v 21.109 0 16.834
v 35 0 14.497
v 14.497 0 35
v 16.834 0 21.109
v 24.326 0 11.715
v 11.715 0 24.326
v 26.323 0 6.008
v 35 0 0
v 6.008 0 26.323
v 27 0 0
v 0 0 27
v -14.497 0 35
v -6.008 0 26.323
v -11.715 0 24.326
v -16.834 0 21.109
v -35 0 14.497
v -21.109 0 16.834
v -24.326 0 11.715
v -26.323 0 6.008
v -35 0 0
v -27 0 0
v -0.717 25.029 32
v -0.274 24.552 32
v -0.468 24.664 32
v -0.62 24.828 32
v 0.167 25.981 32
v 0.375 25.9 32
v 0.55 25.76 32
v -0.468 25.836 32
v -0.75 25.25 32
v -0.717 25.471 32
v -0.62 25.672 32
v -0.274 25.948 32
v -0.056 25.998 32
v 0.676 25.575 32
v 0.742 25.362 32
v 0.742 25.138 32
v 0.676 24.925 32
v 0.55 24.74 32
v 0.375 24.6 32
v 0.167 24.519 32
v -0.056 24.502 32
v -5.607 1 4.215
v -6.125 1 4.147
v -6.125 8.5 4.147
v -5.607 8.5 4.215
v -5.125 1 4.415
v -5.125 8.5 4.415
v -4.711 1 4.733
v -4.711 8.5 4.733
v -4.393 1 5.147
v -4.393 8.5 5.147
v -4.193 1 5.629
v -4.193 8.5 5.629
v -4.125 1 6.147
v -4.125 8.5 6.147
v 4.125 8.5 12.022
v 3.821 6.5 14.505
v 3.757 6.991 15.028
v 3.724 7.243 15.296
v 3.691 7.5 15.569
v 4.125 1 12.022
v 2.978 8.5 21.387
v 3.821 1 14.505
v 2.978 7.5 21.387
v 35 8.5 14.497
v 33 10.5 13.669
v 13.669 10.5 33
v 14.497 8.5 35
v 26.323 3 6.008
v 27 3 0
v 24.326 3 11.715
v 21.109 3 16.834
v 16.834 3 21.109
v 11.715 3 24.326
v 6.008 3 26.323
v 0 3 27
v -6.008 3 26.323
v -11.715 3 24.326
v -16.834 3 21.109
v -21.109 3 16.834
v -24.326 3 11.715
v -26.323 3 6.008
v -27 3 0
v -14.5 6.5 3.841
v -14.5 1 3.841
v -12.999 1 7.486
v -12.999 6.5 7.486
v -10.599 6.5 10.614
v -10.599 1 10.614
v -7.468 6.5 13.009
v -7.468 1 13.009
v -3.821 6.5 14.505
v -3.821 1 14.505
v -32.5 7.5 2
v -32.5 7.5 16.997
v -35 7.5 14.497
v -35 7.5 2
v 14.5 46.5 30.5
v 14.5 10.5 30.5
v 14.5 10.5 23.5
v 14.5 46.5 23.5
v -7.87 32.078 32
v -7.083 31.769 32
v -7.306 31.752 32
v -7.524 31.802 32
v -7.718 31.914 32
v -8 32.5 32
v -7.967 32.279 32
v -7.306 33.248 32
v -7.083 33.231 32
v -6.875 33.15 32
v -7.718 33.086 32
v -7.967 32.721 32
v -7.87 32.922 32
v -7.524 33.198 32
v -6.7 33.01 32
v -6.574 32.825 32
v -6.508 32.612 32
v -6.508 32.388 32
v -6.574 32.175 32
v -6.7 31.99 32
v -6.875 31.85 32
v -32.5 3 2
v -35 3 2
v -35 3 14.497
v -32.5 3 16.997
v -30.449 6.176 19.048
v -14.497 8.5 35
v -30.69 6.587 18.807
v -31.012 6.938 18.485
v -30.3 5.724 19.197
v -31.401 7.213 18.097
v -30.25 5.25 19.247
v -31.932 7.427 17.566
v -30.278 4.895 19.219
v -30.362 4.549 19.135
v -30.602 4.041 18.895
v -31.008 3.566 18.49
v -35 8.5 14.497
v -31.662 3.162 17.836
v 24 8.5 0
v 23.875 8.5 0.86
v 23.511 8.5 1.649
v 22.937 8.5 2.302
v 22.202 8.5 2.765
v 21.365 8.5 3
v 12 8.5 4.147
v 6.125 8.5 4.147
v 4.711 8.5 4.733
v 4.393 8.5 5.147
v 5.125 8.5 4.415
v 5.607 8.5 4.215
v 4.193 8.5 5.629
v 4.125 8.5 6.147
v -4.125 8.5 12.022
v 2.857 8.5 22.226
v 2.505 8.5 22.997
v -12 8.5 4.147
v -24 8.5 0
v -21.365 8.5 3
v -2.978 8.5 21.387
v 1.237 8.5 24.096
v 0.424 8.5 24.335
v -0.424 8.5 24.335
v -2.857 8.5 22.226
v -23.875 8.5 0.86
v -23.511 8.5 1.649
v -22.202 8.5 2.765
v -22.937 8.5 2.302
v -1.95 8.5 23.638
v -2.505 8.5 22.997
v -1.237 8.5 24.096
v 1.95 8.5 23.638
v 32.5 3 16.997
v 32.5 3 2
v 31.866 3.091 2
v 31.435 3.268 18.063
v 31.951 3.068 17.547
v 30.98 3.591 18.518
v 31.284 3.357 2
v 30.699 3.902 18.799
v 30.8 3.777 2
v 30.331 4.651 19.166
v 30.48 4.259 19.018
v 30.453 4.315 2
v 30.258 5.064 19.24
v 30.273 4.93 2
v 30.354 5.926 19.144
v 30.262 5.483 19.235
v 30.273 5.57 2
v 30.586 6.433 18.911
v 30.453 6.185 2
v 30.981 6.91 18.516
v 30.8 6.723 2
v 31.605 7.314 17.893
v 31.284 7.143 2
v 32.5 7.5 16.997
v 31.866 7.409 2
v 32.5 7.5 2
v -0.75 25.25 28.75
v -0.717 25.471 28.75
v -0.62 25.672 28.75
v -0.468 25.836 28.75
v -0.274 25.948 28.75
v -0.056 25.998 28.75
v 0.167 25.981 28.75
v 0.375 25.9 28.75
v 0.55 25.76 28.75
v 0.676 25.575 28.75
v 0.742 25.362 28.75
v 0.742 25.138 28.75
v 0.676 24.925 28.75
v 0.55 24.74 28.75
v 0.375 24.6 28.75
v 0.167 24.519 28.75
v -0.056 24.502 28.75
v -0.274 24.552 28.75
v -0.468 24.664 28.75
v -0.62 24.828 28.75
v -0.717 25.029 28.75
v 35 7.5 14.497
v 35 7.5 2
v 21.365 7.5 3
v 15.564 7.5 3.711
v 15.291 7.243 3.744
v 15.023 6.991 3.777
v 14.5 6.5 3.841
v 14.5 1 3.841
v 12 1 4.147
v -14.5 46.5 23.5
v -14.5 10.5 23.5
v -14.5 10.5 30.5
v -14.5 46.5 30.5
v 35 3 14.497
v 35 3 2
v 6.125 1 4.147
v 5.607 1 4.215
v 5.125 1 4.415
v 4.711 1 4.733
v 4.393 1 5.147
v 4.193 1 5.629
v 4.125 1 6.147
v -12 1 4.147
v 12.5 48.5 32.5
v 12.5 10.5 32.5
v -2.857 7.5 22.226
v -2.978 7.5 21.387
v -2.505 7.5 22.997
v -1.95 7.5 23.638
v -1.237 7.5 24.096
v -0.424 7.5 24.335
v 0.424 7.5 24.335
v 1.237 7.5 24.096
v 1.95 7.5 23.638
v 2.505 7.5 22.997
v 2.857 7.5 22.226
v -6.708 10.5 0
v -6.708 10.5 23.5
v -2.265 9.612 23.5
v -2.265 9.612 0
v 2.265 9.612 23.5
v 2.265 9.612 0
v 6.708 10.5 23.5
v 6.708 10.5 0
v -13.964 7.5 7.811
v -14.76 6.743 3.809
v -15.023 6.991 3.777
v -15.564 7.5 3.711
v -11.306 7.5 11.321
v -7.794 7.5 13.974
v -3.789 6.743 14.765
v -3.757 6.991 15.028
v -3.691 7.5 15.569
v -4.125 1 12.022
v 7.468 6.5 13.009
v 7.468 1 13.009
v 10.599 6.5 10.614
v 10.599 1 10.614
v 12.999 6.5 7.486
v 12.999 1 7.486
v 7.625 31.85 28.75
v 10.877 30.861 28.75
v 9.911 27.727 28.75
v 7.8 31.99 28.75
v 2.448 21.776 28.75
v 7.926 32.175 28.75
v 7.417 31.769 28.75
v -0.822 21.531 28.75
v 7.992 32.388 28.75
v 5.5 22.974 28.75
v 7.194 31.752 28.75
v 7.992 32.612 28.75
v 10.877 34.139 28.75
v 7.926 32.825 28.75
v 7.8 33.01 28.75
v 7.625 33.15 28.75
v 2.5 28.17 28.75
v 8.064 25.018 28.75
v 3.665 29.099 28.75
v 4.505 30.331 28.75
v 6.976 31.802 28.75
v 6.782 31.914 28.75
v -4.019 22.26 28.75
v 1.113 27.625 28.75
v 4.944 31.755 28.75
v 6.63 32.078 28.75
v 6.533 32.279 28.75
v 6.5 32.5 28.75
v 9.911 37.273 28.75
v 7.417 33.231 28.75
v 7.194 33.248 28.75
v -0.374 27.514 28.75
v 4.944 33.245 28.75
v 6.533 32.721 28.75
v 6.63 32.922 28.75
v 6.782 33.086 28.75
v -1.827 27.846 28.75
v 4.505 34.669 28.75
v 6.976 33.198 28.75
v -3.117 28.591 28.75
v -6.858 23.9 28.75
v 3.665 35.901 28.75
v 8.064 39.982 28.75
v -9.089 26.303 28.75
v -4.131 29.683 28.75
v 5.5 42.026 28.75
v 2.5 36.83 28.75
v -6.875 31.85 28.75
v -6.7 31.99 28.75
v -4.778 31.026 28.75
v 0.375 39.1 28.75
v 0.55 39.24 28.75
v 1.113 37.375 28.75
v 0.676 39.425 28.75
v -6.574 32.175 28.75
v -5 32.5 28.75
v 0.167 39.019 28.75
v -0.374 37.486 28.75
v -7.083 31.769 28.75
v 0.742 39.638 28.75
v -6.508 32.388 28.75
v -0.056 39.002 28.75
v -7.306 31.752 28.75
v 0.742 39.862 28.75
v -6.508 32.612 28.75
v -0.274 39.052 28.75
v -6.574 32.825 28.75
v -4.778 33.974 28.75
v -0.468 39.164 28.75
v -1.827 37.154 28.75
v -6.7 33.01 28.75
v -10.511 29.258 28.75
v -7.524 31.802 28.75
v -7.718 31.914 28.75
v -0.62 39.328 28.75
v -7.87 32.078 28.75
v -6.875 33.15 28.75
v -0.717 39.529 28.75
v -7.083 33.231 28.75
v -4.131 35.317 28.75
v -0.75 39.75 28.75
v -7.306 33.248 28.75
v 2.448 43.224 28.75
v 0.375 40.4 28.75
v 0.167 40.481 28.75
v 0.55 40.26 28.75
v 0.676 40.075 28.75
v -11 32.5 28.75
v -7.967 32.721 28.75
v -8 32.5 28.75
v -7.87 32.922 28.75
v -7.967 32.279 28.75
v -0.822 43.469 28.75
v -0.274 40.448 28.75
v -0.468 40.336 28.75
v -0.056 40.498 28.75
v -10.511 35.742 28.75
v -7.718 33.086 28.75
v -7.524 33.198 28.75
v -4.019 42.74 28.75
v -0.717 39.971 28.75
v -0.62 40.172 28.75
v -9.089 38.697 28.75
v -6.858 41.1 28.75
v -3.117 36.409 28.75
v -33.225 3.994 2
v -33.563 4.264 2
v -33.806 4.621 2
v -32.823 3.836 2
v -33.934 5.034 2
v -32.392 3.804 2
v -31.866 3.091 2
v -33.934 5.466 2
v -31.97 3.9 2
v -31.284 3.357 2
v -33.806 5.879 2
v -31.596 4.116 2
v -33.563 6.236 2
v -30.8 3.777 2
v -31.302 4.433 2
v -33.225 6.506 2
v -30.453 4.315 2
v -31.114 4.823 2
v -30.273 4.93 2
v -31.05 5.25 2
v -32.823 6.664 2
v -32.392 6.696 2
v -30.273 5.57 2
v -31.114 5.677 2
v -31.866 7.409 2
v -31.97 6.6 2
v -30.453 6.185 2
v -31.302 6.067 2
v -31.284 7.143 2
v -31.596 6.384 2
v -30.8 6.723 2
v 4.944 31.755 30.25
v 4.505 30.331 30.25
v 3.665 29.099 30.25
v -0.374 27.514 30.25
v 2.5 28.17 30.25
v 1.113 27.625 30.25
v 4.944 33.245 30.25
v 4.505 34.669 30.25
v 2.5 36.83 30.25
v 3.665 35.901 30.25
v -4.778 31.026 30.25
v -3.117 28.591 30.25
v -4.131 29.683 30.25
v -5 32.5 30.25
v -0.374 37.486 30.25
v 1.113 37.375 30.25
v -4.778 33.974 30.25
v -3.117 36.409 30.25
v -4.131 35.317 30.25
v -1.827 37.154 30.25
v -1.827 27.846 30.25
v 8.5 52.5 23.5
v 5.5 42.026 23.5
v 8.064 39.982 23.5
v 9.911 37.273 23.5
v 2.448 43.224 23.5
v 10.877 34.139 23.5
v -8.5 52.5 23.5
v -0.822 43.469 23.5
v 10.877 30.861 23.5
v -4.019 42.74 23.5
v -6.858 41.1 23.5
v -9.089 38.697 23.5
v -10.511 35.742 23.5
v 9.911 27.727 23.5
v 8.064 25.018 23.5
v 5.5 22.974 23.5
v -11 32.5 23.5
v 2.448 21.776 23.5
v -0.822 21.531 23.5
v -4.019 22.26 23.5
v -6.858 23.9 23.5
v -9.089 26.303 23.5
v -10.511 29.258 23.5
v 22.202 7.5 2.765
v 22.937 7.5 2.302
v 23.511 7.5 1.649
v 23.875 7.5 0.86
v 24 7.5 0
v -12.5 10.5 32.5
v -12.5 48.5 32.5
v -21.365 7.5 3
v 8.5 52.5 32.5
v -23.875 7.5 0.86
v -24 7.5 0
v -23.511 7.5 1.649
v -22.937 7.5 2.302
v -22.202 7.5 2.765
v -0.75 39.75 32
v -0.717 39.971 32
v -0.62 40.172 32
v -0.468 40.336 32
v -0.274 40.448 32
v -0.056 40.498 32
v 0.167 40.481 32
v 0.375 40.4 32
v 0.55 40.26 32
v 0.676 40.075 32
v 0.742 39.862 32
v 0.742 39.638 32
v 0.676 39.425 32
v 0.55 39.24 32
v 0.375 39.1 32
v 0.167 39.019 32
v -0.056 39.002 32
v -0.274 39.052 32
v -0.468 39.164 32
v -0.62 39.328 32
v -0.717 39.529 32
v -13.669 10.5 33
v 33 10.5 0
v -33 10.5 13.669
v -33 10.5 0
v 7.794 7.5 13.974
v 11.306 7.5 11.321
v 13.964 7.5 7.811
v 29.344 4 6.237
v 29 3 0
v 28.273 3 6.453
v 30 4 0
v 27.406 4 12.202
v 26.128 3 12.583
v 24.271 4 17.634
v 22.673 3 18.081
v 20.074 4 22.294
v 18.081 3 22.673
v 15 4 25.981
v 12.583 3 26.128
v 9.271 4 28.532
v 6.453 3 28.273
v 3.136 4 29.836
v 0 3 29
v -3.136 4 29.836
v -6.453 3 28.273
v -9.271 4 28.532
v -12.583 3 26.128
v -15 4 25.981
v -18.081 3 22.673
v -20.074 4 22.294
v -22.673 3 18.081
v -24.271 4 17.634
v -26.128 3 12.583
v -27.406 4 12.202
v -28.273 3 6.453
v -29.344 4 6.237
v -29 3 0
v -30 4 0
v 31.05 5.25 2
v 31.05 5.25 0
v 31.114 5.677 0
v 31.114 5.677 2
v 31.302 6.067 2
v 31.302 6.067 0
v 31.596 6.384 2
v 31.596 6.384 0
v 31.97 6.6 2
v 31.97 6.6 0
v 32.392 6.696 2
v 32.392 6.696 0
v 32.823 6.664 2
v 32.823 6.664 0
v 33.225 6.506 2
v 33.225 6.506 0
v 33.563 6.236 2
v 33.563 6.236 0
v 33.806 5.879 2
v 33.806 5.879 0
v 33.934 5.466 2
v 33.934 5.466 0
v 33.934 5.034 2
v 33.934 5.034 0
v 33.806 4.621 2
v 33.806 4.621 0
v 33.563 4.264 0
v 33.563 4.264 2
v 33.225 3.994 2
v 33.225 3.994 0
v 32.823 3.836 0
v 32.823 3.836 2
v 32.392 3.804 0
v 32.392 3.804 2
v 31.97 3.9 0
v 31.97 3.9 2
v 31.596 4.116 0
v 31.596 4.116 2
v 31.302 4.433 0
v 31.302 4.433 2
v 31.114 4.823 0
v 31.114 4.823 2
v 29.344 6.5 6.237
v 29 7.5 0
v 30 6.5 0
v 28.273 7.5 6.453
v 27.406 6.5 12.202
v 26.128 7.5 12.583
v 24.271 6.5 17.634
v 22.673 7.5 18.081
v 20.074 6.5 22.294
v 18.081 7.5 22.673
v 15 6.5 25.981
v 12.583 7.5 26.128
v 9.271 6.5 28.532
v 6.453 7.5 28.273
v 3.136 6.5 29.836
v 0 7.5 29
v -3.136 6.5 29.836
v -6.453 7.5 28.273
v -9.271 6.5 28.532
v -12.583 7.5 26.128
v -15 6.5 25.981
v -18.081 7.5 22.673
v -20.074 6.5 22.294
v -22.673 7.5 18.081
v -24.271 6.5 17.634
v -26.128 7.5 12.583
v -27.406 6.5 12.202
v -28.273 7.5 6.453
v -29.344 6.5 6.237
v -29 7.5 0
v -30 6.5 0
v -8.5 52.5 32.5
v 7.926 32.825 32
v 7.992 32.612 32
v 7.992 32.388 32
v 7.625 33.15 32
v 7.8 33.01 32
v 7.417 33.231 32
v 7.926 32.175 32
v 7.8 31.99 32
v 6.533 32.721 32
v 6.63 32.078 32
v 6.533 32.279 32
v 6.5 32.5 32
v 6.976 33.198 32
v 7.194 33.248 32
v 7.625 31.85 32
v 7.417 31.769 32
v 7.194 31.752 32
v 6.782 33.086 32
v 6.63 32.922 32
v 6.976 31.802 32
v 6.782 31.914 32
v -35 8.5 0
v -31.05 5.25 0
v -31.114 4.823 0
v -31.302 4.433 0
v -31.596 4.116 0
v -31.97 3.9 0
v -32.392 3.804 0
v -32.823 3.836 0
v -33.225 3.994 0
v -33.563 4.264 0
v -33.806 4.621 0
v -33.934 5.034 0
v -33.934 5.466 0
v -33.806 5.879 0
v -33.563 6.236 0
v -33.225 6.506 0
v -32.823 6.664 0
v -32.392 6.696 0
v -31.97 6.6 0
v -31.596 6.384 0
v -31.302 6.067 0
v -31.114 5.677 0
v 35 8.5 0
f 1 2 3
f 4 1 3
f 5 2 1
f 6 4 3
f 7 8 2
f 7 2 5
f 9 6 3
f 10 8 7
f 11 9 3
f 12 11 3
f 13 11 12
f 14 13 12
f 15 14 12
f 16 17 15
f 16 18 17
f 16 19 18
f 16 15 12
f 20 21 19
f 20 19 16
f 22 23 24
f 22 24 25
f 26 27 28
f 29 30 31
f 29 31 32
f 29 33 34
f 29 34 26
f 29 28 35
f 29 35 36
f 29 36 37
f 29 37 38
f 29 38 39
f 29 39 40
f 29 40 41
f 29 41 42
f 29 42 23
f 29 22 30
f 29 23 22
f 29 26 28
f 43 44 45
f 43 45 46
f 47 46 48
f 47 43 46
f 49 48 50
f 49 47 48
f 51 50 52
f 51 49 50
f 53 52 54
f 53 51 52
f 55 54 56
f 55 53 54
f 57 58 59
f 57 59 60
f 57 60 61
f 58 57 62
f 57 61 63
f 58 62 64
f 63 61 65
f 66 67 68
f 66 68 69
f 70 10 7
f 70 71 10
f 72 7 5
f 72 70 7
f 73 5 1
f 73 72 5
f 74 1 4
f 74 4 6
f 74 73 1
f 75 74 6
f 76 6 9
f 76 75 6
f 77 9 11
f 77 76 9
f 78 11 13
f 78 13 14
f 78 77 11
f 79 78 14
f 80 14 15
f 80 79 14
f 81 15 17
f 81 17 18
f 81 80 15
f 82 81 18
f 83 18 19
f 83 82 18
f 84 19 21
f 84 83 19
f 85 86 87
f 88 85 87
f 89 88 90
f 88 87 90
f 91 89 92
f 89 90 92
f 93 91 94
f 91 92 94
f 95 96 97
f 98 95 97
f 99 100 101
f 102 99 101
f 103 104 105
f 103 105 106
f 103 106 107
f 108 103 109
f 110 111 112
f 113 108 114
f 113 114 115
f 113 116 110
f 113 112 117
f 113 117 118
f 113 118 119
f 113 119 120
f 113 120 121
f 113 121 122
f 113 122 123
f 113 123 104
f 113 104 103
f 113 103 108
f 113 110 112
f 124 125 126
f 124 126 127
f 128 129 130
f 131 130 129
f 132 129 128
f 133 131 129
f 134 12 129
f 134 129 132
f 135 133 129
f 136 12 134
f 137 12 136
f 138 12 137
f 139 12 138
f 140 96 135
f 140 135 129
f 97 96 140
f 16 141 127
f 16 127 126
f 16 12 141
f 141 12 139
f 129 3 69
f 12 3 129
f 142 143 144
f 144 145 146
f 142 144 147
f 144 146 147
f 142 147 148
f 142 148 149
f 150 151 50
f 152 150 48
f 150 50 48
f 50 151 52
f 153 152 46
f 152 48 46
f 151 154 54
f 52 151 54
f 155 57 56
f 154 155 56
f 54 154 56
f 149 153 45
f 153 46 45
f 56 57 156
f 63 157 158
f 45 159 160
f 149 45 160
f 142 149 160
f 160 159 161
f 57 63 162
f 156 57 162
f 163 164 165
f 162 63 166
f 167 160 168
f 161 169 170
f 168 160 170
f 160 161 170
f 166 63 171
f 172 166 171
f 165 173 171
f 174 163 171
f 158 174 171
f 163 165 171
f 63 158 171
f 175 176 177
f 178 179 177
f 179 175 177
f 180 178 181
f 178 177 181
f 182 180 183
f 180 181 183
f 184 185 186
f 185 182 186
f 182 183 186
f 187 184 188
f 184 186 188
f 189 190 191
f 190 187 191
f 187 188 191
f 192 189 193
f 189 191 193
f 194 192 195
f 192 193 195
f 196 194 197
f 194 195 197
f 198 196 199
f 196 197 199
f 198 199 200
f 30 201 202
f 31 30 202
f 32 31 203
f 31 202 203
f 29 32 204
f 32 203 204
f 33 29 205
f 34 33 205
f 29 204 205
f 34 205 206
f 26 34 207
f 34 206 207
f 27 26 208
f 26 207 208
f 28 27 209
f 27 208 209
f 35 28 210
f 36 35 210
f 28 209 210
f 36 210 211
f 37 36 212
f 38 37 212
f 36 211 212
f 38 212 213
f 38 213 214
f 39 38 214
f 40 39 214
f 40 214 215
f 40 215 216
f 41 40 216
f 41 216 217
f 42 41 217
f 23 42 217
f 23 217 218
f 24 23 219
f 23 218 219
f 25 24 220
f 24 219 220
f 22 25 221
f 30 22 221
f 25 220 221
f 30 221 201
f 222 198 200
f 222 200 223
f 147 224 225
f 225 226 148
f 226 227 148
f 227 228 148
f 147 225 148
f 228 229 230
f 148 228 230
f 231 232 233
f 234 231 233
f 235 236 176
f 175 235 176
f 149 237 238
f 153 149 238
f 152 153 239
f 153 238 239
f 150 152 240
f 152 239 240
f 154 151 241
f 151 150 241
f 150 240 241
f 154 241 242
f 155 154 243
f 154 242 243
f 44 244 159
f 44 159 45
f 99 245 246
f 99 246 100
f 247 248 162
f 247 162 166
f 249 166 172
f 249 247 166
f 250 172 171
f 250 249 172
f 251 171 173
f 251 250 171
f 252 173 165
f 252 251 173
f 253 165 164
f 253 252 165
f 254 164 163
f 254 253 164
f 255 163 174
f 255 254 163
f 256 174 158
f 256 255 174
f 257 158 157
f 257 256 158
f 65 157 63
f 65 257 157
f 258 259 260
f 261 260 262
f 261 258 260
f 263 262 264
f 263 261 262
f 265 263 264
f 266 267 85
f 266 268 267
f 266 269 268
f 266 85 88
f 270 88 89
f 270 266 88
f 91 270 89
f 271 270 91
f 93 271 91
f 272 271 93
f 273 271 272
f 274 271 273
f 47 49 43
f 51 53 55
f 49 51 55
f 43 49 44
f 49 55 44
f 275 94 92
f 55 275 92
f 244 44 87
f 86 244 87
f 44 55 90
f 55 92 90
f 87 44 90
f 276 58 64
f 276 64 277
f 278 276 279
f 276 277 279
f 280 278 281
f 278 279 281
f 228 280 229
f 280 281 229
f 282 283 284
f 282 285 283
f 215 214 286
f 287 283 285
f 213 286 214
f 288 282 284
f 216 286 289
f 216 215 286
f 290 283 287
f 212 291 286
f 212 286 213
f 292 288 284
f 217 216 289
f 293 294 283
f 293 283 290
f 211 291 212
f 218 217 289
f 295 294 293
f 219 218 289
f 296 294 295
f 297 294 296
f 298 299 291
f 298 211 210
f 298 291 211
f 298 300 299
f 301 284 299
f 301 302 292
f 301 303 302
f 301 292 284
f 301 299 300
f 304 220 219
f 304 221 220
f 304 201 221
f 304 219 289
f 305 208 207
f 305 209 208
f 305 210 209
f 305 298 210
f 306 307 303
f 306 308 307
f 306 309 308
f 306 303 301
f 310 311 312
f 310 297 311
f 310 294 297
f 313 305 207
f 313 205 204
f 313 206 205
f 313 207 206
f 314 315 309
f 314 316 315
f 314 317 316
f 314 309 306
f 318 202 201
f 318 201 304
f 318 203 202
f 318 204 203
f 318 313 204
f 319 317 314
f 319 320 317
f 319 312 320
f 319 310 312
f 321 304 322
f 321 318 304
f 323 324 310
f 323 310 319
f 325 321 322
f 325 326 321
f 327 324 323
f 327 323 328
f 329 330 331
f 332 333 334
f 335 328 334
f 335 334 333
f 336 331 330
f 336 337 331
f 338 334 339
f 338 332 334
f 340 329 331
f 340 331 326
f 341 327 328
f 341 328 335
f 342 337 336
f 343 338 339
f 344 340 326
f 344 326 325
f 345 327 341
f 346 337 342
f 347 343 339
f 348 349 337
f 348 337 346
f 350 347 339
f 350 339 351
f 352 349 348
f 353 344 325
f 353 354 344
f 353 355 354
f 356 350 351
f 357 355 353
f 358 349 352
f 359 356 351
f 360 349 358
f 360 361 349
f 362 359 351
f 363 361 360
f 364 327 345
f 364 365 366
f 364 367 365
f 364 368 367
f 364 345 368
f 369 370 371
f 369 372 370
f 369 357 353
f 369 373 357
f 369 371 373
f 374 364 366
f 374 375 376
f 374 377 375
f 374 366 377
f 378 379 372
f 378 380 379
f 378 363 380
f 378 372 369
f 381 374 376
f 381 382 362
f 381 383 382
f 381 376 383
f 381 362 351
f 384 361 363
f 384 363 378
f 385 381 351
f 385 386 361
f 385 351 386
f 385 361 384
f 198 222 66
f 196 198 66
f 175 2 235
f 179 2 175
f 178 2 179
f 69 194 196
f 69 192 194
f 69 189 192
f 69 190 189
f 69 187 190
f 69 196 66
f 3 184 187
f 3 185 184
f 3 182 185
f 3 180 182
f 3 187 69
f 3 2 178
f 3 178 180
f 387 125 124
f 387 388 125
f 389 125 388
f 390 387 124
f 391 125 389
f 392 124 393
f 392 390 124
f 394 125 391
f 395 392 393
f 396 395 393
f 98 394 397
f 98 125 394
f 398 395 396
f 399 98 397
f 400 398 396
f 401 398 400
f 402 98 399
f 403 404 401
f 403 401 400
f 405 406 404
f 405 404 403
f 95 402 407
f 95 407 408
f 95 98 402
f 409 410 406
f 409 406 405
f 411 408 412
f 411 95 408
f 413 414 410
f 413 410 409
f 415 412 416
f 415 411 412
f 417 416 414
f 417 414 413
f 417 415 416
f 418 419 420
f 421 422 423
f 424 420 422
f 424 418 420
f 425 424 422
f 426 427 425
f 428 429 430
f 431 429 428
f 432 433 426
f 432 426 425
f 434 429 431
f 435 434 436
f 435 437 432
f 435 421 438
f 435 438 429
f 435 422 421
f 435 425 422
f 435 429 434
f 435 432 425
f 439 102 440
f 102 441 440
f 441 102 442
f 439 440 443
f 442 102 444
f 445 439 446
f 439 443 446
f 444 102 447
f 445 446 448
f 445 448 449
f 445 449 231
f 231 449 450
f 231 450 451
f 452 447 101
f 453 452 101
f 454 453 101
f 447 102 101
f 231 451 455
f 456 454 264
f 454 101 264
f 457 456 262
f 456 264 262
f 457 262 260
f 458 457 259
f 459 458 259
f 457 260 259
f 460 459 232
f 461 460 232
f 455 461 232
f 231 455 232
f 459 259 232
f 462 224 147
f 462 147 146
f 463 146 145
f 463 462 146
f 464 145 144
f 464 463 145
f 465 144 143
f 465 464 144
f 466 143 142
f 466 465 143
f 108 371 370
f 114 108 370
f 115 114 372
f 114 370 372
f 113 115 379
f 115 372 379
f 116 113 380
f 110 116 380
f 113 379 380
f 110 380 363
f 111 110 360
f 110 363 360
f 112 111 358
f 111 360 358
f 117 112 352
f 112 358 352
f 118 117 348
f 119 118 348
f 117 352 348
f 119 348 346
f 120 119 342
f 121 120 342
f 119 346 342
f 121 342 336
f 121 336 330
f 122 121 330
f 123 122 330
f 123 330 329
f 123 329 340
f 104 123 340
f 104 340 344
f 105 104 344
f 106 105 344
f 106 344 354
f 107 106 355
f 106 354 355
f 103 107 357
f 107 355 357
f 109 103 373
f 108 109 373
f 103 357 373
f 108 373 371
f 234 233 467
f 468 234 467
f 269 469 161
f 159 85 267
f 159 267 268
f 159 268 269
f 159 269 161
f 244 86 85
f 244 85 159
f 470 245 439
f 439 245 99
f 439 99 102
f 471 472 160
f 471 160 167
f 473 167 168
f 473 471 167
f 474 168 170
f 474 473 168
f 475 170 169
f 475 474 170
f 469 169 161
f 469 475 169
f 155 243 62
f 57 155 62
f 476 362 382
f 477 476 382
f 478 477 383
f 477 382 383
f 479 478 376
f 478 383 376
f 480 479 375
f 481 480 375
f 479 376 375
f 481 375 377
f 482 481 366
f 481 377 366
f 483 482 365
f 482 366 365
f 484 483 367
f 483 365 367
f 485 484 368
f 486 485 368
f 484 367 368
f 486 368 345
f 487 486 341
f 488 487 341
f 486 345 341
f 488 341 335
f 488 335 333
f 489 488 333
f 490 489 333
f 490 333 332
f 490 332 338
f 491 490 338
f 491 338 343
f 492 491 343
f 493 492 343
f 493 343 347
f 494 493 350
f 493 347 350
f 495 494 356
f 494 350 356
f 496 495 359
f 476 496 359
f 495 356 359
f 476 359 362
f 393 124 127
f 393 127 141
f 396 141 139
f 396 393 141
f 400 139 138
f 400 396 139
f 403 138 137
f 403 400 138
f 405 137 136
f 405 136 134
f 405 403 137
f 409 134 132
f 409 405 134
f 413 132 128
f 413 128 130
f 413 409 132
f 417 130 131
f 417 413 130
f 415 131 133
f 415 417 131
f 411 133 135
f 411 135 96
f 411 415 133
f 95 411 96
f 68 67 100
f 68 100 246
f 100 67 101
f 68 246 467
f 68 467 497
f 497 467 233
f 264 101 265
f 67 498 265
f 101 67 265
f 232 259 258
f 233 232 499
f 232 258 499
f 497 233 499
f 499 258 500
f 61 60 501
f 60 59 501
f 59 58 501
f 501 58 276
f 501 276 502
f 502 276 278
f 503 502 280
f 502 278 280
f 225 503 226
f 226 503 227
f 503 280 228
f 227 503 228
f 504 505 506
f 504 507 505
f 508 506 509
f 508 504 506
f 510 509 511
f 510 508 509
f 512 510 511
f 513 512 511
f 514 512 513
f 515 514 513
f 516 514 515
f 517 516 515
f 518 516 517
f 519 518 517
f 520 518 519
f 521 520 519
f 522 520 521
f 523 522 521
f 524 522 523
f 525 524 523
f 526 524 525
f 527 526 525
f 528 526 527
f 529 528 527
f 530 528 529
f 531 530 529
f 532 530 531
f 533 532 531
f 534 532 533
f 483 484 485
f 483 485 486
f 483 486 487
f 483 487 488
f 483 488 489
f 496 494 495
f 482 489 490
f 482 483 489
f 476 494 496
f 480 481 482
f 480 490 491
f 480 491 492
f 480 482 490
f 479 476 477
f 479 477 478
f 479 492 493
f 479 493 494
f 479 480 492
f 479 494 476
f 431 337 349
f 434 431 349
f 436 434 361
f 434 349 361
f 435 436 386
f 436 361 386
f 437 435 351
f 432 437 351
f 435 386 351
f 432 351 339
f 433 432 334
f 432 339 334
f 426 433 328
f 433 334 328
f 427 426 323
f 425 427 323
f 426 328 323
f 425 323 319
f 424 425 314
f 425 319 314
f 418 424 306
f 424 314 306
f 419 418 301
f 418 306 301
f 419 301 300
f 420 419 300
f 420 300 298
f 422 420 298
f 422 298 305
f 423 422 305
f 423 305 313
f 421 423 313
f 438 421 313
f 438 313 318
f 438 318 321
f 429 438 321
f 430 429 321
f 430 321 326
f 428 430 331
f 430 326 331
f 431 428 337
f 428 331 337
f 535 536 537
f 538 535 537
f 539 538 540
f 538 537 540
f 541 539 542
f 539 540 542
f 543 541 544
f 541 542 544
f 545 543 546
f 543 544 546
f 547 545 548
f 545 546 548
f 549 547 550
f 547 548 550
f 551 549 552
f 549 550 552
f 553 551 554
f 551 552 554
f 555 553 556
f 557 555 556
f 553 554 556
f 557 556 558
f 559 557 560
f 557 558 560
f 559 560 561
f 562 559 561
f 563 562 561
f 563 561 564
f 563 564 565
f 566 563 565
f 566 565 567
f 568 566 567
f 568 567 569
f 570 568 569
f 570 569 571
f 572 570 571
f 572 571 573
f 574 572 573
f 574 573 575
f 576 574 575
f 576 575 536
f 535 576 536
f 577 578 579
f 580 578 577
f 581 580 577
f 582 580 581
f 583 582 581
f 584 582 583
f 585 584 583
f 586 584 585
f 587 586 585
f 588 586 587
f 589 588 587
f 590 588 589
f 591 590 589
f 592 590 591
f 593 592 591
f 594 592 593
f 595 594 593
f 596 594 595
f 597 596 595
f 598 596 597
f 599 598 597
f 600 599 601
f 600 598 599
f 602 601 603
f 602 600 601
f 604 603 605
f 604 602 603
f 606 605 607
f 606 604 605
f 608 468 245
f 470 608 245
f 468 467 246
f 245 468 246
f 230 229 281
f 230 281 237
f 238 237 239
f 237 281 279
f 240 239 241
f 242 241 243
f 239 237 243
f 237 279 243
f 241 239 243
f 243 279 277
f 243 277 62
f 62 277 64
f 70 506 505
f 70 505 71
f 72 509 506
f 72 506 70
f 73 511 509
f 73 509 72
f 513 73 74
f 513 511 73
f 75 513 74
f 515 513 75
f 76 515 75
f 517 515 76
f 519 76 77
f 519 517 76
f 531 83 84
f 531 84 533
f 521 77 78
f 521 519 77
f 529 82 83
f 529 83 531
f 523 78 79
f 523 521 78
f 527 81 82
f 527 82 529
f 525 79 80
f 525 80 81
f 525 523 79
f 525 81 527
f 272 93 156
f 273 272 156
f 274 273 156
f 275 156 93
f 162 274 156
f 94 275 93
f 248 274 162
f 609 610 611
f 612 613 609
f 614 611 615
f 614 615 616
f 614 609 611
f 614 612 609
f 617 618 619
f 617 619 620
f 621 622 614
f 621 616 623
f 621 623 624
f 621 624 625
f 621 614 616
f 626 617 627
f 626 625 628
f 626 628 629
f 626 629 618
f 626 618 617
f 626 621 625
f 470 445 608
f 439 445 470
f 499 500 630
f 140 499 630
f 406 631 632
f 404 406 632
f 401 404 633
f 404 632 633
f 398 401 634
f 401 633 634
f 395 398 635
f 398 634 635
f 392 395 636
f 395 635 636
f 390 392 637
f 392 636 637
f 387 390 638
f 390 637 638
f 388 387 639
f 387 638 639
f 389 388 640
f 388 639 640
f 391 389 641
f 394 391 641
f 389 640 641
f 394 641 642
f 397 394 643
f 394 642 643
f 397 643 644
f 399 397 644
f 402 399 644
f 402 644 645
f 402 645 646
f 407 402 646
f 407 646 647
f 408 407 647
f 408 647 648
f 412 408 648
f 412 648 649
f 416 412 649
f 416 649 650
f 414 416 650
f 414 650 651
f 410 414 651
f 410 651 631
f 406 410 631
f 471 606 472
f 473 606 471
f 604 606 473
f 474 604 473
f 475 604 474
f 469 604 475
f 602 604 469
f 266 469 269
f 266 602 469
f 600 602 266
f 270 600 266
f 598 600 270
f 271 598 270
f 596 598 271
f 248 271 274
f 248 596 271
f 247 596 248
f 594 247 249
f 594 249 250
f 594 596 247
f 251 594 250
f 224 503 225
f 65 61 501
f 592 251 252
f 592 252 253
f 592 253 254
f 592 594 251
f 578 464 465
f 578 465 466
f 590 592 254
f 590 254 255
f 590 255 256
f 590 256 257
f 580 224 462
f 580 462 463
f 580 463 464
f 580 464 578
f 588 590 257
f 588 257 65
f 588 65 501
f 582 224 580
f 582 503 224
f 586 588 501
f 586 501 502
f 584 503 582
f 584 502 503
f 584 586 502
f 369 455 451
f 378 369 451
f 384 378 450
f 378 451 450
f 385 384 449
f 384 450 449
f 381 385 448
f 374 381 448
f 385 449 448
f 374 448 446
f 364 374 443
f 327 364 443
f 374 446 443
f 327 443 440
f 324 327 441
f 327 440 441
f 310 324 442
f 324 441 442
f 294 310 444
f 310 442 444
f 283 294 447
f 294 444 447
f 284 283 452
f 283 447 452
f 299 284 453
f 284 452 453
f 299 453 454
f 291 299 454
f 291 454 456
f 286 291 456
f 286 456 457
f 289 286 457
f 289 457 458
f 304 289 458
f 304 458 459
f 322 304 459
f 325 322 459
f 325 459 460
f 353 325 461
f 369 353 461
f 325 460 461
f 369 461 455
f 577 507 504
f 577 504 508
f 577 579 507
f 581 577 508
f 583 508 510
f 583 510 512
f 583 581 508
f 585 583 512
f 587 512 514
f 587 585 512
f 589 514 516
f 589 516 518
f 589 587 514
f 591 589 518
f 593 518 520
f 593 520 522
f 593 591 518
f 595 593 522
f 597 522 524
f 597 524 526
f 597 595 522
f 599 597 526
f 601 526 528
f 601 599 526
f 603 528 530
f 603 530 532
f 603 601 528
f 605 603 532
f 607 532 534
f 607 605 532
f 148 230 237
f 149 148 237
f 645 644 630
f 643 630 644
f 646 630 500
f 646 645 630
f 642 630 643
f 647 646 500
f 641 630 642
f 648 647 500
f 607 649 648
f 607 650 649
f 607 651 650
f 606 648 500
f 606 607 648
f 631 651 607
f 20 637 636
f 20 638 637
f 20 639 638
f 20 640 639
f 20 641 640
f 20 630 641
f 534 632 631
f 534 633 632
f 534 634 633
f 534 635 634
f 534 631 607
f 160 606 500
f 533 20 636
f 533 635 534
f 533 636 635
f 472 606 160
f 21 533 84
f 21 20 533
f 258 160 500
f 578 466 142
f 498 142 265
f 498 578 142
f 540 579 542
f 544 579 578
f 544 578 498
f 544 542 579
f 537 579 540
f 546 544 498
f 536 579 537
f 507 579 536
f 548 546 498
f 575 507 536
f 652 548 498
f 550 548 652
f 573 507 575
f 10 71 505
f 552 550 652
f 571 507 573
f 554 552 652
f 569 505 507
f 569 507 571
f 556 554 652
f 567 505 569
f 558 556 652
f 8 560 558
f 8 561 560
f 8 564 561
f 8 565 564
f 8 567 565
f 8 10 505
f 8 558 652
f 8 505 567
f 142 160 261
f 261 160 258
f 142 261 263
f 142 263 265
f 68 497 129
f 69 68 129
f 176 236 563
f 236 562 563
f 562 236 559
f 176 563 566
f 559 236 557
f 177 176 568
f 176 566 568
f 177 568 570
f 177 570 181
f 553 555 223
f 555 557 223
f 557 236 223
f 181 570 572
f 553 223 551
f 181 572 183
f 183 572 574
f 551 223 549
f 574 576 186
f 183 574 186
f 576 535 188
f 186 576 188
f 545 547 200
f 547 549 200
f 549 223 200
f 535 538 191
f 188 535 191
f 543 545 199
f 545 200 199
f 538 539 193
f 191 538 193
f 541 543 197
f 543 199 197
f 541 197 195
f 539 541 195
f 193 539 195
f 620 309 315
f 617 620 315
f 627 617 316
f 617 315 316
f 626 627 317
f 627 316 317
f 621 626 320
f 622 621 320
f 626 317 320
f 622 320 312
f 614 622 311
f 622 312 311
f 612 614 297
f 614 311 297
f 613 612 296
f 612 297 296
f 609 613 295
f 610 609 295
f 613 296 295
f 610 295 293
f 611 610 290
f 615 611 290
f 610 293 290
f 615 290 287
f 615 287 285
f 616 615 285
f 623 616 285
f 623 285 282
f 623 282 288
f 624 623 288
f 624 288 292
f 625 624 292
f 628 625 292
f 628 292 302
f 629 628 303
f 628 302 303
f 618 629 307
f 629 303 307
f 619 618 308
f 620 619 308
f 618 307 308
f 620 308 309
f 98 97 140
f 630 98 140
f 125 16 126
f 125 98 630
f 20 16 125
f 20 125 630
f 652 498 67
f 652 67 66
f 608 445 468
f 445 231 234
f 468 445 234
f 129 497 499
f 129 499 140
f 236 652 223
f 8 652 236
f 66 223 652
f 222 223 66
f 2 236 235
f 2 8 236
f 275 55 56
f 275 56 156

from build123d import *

# Parameters (mm, degrees)
BOSS_EXTRUDE1_DEPTH = 10.5
BOSS_EXTRUDE2_DEPTH = 42
CUT_REVOLVE1_ANGLE  = 180.0000000000004
CHAMFER1_SIZE       = 6
CHAMFER2_SIZE       = 2
CUT_EXTRUDE2_DEPTH  = 1
BOSS_EXTRUDE3_START = 6.5
BOSS_EXTRUDE3_DEPTH = 6.5
CHAMFER3_SIZE       = 1
SKETCH10_R          = 1.45
CUT_EXTRUDE6_DEPTH  = 10
SKETCH11_R          = 1.45
CUT_EXTRUDE7_DEPTH  = 72.20568797504873
MIRROR1_START       = 2
MIRROR1_DEPTH       = 17.247474683
SKETCH12_R          = 10.999999999999998
CUT_EXTRUDE8_DEPTH  = 5.25
SKETCH13_R          = 0.7500000000000007
SKETCH13_R_2        = 0.7499999999999987
SKETCH13_R_3        = 0.75
SKETCH13_R_4        = 0.7500000000000037
CUT_EXTRUDE9_DEPTH  = 3.25
SKETCH14_R          = 4.999999999999999
CUT_EXTRUDE10_DEPTH = 1.5
CUT_EXTRUDE11_DEPTH = 23.5


# Read off the part's stored shape, not the designer's step: Mirror1
with BuildPart() as part:
    # Sketch1 → Boss-Extrude1 (new body)
    with BuildSketch(Plane(origin=(0, 0, 0), x_dir=(1, 0, 0), z_dir=(0, 1, 0))):
        Polygon((-35, 0), (35, 0), (35, -14.497474683058336), (14.497474683058336, -35), (-14.497474683058336, -35), (-35, -14.497474683058334), align=None)
    extrude(amount=BOSS_EXTRUDE1_DEPTH)

    # Sketch2 → Boss-Extrude2 (add)
    with BuildSketch(Plane(origin=(0, 10.5, 0), x_dir=(1, 0, 0), z_dir=(0, 1, 0))):
        Polygon((-14.5, -32.5), (14.5, -32.49999999999999), (14.5, -23.499999999999993), (-14.5, -23.499999999999993), align=None)
    extrude(amount=BOSS_EXTRUDE2_DEPTH)

    # Sketch3 → Cut-Revolve1 (revolve, cut)
    with BuildSketch(Plane(origin=(0, 0, 0), x_dir=(-1, 0, 0), z_dir=(0, 0, -1))):
        Polygon((-27.000000000000004, 0), (-27.000000000000004, 3), (-29, 2.999999999999999), (-30.000000000000004, 4), (-30.000000000000004, 6.5), (-29, 7.500000000000001), (0, 7.5), (0, 0), align=None)
    revolve(axis=Axis((0, 0, 0), (0, -1, 0)), revolution_arc=CUT_REVOLVE1_ANGLE, mode=Mode.SUBTRACT)

    # Chamfer1
    chamfer1_edges = [part.edges().sort_by_distance(p)[0] for p in [
        (-14.5, 52.5, 27.999999999999996),
        (14.5, 52.5, 27.999999999999993),
    ]]
    chamfer(chamfer1_edges, length=CHAMFER1_SIZE)

    # Chamfer2
    # the kernel refuses this chamfer: 2 mm, written as the material it takes off along each edge
    with BuildSketch(Plane(origin=(38.63690895970556, 10.5, 10.860565723352778), x_dir=(-0.7068394360706735, 0.02749587661058652, -0.7068394360706735), z_dir=(-0.7071067811865476, 0, 0.7071067811865476)), Plane(origin=(-10.860565723352778, 10.5, 38.63690895970556), x_dir=(0.7068394360706735, 0.02749587661058652, -0.7068394360706735), z_dir=(-0.7071067811865476, 0, -0.7071067811865476))) as chamfer2_piece_1:
        Polygon((CHAMFER2_SIZE * 0.999621916911, CHAMFER2_SIZE * 0.0274958766106), (-CHAMFER2_SIZE * 0.0274958766106, CHAMFER2_SIZE * 0.999621916911), (0, 0), align=None)
    extrude(amount=39.28168131798029, mode=Mode.SUBTRACT)
    with BuildSketch(Plane(origin=(35, 10.5, -5.14336597593182), x_dir=(-0.9996219169112968, 0.02749587661058651, 0), z_dir=(0, 0, 1)), Plane(origin=(-35, 10.5, 19.640840658990157), x_dir=(0.9996219169112968, 0.02749587661058651, 0), z_dir=(0, 0, -1))) as chamfer2_piece_2:
        Polygon((CHAMFER2_SIZE * 0.999621916911, CHAMFER2_SIZE * 0.0274958766106), (-CHAMFER2_SIZE * 0.0274958766106, CHAMFER2_SIZE * 0.999621916911), (0, 0), align=None)
    extrude(amount=24.78420663492198, mode=Mode.SUBTRACT)
    with BuildSketch(Plane(origin=(14.5, 10.5, 32.49999999999999), x_dir=(-0.9996219169112968, 0, 0.027495876610585623), z_dir=(0, 1, 0))) as chamfer2_piece_3:
        Polygon((CHAMFER2_SIZE * 0.999621916911, -CHAMFER2_SIZE * 0.0274958766106), (-CHAMFER2_SIZE * 0.0274958766106, -CHAMFER2_SIZE * 0.999621916911), (0, 0), align=None)
    extrude(amount=41.14336597593182, mode=Mode.SUBTRACT)
    with BuildSketch(Plane(origin=(-14.5, 10.5, 32.5), x_dir=(-0.02749587661058651, 0, -0.9996219169112968), z_dir=(0, 1, 0))) as chamfer2_piece_4:
        Polygon((CHAMFER2_SIZE * 0.999621916911, -CHAMFER2_SIZE * 0.0274958766106), (-CHAMFER2_SIZE * 0.0274958766106, -CHAMFER2_SIZE * 0.999621916911), (0, 0), align=None)
    extrude(amount=41.14336597593182, mode=Mode.SUBTRACT)
    with BuildSketch(Plane(origin=(19.640840658990157, 10.5, 35), x_dir=(0, 0.02749587661058651, -0.9996219169112968), z_dir=(-1, 0, 0))) as chamfer2_piece_5:
        Polygon((CHAMFER2_SIZE * 0.999621916911, CHAMFER2_SIZE * 0.0274958766106), (-CHAMFER2_SIZE * 0.0274958766106, CHAMFER2_SIZE * 0.999621916911), (0, 0), align=None)
    extrude(amount=39.281681317980315, mode=Mode.SUBTRACT)

    # Sketch5 → Cut-Extrude2 (cut)
    with BuildSketch(Plane.XZ.offset(-7.5)):
        with BuildLine():
            Line((24, 8.82e-15), (-24, 0))
            ThreePointArc((-24, 0), (-23.247716404991003, 1.9964484090504302), (-21.365000000000002, 3))
            Line((-21.365000000000002, 3), (-12.000000000000002, 4.147))
            Line((-12.000000000000002, 4.147), (-6.125000000000002, 4.147000000000001))
            ThreePointArc((-6.125000000000002, 4.147000000000001), (-4.710786437626908, 4.732786437626906), (-4.125000000000002, 6.146999999999999))
            Line((-4.125000000000002, 6.146999999999999), (-4.125000000000002, 12.022))
            Line((-4.125000000000002, 12.022), (-2.9780000000000033, 21.387))
            ThreePointArc((-2.9780000000000033, 21.387), (1.8e-16, 24.365000000000002), (2.9780000000000033, 21.387))
            Line((2.9780000000000033, 21.387), (4.125000000000002, 12.022))
            Line((4.125000000000002, 12.022), (4.125000000000002, 6.146999999999999))
            ThreePointArc((4.125000000000002, 6.146999999999999), (4.710786437626908, 4.732786437626905), (6.125000000000002, 4.147000000000001))
            Line((6.125000000000002, 4.147000000000001), (12.000000000000002, 4.147))
            Line((12.000000000000002, 4.147), (21.365000000000002, 3))
            ThreePointArc((21.365000000000002, 3), (23.247716404991003, 1.996448409050434), (24, 8.82e-15))
        make_face()
    extrude(amount=-CUT_EXTRUDE2_DEPTH, mode=Mode.SUBTRACT)

    # Sketch6 → Boss-Extrude3 (add)
    with BuildSketch(Plane.XZ.offset(-7.5).offset(BOSS_EXTRUDE3_START)):
        with BuildLine():
            Line((14.499935981026823, 3.8408145680472217), (12.000000000000002, 4.147))
            Line((12.000000000000002, 4.147), (6.125000000000002, 4.147))
            ThreePointArc((6.125000000000002, 4.147), (4.710786437626906, 4.732786437626904), (4.125000000000002, 6.146999999999999))
            Line((4.125000000000002, 6.146999999999999), (4.125000000000002, 12.022))
            Line((4.125000000000002, 12.022), (3.8208636103945306, 14.505206005802291))
            ThreePointArc((3.8208636103945306, 14.505206005802291), (10.599303543236797, 10.613894874094425), (14.499935981026823, 3.8408145680472217))
        make_face()
        with BuildLine():
            Line((-3.8208636103945306, 14.505206005802291), (-4.125000000000002, 12.022))
            Line((-4.125000000000002, 12.022), (-4.125000000000003, 6.146999999999999))
            ThreePointArc((-4.125000000000003, 6.146999999999999), (-4.710786437626908, 4.732786437626906), (-6.125000000000002, 4.147000000000001))
            Line((-6.125000000000002, 4.147000000000001), (-12.000000000000002, 4.147))
            Line((-12.000000000000002, 4.147), (-14.499935981026823, 3.8408145680472217))
            ThreePointArc((-14.499935981026823, 3.8408145680472217), (-10.599303543236797, 10.613894874094424), (-3.8208636103945306, 14.505206005802291))
        make_face()
    extrude(amount=-BOSS_EXTRUDE3_DEPTH)

    # Chamfer3
    chamfer3_edges = [part.edges().sort_by_distance(p)[0] for p in [
        (10.5993035432368, 7.5, 10.613894874094427),
        (-10.599303543236797, 7.5, 10.613894874094424),
    ]]
    chamfer(chamfer3_edges, length=CHAMFER3_SIZE)

    # Sketch10 → Cut-Extrude6 (cut)
    with BuildSketch(Plane(origin=(0, 0, 0), x_dir=(-1, 0, 0), z_dir=(0, 0, -1))):
        with Locations((-32.5, 5.249999999999999)):
            Circle(SKETCH10_R)
        with Locations(Location((32.5, 5.249999999999999, 0), (0, 0, 180))):
            Circle(SKETCH10_R)
    extrude(amount=-CUT_EXTRUDE6_DEPTH, mode=Mode.SUBTRACT)

    # Sketch11 → Cut-Extrude7 (cut, through all)
    with BuildSketch(Plane(origin=(0, 0, 2), x_dir=(-1, 0, 0), z_dir=(0, 0, -1))):
        with BuildLine():
            Line((-32.5, 7.499999999999998), (-35, 7.499999999999998))
            Line((-35, 7.499999999999998), (-35, 3.000000000000001))
            Line((-35, 3.000000000000001), (-32.5, 3.0000000000000004))
            ThreePointArc((-32.5, 3.0000000000000004), (-30.25, 5.249999999999999), (-32.5, 7.499999999999998))
        make_face()
        with Locations((-32.5, 5.249999999999999)):
            Circle(SKETCH11_R, mode=Mode.SUBTRACT)
    extrude(amount=-CUT_EXTRUDE7_DEPTH, mode=Mode.SUBTRACT)


with BuildPart() as cut_extrude7_kept_piece:
    # of the separate pieces the step leaves, the one the design keeps (cut_extrude7_pieces_kept)
    add(part.part.solids().sort_by_distance((15.563806793, 7.5, 3.710514534))[0])

    # Mirror1 outline → Mirror1 (cut)
    with BuildSketch(Plane.XY.offset(MIRROR1_START)):
        with BuildLine():
            Line((-32.5, 7.5), (-35, 7.5))
            Line((-35, 7.5), (-35, 3))
            Line((-35, 3), (-32.5, 3))
            ThreePointArc((-32.5, 3), (-30.25, 5.25), (-32.5, 7.5))
        make_face()
    extrude(amount=MIRROR1_DEPTH, mode=Mode.SUBTRACT)

    # Sketch12 → Cut-Extrude8 (cut)
    with BuildSketch(Plane(origin=(0, 0, 23.499999999999993), x_dir=(-1, 0, 0), z_dir=(0, 0, -1))):
        with Locations((0, 32.5)):
            Circle(SKETCH12_R)
    extrude(amount=-CUT_EXTRUDE8_DEPTH, mode=Mode.SUBTRACT)

    # Sketch13 → Cut-Extrude9 (cut)
    with BuildSketch(Plane(origin=(0, 0, 28.749999999999993), x_dir=(-1, 0, 0), z_dir=(0, 0, -1))):
        with Locations((0, 25.25)):
            Circle(SKETCH13_R)
        with Locations((-7.249999999999999, 32.49999999999999)):
            Circle(SKETCH13_R_2)
        with Locations((-8.9e-16, 39.75)):
            Circle(SKETCH13_R_3)
        with Locations((7.249999999999999, 32.50000000000001)):
            Circle(SKETCH13_R_4)
    extrude(amount=-CUT_EXTRUDE9_DEPTH, mode=Mode.SUBTRACT)

    # Sketch14 → Cut-Extrude10 (cut)
    with BuildSketch(Plane(origin=(0, 0, 28.749999999999993), x_dir=(-1, 0, 0), z_dir=(0, 0, -1))):
        with Locations((0, 32.5)):
            Circle(SKETCH14_R)
    extrude(amount=-CUT_EXTRUDE10_DEPTH, mode=Mode.SUBTRACT)

    # Sketch16 → Cut-Extrude11 (cut)
    with BuildSketch(Plane(origin=(0, 0, 0), x_dir=(-1, 0, 0), z_dir=(0, 0, -1))):
        with BuildLine():
            Line((-6.708203932499372, 10.500000000000002), (6.708203932499372, 10.500000000000002))
            ThreePointArc((6.708203932499372, 10.500000000000002), (1.41e-15, 9.5), (-6.708203932499372, 10.500000000000002))
        make_face()
    extrude(amount=-CUT_EXTRUDE11_DEPTH, mode=Mode.SUBTRACT)


solid = cut_extrude7_kept_piece.part
